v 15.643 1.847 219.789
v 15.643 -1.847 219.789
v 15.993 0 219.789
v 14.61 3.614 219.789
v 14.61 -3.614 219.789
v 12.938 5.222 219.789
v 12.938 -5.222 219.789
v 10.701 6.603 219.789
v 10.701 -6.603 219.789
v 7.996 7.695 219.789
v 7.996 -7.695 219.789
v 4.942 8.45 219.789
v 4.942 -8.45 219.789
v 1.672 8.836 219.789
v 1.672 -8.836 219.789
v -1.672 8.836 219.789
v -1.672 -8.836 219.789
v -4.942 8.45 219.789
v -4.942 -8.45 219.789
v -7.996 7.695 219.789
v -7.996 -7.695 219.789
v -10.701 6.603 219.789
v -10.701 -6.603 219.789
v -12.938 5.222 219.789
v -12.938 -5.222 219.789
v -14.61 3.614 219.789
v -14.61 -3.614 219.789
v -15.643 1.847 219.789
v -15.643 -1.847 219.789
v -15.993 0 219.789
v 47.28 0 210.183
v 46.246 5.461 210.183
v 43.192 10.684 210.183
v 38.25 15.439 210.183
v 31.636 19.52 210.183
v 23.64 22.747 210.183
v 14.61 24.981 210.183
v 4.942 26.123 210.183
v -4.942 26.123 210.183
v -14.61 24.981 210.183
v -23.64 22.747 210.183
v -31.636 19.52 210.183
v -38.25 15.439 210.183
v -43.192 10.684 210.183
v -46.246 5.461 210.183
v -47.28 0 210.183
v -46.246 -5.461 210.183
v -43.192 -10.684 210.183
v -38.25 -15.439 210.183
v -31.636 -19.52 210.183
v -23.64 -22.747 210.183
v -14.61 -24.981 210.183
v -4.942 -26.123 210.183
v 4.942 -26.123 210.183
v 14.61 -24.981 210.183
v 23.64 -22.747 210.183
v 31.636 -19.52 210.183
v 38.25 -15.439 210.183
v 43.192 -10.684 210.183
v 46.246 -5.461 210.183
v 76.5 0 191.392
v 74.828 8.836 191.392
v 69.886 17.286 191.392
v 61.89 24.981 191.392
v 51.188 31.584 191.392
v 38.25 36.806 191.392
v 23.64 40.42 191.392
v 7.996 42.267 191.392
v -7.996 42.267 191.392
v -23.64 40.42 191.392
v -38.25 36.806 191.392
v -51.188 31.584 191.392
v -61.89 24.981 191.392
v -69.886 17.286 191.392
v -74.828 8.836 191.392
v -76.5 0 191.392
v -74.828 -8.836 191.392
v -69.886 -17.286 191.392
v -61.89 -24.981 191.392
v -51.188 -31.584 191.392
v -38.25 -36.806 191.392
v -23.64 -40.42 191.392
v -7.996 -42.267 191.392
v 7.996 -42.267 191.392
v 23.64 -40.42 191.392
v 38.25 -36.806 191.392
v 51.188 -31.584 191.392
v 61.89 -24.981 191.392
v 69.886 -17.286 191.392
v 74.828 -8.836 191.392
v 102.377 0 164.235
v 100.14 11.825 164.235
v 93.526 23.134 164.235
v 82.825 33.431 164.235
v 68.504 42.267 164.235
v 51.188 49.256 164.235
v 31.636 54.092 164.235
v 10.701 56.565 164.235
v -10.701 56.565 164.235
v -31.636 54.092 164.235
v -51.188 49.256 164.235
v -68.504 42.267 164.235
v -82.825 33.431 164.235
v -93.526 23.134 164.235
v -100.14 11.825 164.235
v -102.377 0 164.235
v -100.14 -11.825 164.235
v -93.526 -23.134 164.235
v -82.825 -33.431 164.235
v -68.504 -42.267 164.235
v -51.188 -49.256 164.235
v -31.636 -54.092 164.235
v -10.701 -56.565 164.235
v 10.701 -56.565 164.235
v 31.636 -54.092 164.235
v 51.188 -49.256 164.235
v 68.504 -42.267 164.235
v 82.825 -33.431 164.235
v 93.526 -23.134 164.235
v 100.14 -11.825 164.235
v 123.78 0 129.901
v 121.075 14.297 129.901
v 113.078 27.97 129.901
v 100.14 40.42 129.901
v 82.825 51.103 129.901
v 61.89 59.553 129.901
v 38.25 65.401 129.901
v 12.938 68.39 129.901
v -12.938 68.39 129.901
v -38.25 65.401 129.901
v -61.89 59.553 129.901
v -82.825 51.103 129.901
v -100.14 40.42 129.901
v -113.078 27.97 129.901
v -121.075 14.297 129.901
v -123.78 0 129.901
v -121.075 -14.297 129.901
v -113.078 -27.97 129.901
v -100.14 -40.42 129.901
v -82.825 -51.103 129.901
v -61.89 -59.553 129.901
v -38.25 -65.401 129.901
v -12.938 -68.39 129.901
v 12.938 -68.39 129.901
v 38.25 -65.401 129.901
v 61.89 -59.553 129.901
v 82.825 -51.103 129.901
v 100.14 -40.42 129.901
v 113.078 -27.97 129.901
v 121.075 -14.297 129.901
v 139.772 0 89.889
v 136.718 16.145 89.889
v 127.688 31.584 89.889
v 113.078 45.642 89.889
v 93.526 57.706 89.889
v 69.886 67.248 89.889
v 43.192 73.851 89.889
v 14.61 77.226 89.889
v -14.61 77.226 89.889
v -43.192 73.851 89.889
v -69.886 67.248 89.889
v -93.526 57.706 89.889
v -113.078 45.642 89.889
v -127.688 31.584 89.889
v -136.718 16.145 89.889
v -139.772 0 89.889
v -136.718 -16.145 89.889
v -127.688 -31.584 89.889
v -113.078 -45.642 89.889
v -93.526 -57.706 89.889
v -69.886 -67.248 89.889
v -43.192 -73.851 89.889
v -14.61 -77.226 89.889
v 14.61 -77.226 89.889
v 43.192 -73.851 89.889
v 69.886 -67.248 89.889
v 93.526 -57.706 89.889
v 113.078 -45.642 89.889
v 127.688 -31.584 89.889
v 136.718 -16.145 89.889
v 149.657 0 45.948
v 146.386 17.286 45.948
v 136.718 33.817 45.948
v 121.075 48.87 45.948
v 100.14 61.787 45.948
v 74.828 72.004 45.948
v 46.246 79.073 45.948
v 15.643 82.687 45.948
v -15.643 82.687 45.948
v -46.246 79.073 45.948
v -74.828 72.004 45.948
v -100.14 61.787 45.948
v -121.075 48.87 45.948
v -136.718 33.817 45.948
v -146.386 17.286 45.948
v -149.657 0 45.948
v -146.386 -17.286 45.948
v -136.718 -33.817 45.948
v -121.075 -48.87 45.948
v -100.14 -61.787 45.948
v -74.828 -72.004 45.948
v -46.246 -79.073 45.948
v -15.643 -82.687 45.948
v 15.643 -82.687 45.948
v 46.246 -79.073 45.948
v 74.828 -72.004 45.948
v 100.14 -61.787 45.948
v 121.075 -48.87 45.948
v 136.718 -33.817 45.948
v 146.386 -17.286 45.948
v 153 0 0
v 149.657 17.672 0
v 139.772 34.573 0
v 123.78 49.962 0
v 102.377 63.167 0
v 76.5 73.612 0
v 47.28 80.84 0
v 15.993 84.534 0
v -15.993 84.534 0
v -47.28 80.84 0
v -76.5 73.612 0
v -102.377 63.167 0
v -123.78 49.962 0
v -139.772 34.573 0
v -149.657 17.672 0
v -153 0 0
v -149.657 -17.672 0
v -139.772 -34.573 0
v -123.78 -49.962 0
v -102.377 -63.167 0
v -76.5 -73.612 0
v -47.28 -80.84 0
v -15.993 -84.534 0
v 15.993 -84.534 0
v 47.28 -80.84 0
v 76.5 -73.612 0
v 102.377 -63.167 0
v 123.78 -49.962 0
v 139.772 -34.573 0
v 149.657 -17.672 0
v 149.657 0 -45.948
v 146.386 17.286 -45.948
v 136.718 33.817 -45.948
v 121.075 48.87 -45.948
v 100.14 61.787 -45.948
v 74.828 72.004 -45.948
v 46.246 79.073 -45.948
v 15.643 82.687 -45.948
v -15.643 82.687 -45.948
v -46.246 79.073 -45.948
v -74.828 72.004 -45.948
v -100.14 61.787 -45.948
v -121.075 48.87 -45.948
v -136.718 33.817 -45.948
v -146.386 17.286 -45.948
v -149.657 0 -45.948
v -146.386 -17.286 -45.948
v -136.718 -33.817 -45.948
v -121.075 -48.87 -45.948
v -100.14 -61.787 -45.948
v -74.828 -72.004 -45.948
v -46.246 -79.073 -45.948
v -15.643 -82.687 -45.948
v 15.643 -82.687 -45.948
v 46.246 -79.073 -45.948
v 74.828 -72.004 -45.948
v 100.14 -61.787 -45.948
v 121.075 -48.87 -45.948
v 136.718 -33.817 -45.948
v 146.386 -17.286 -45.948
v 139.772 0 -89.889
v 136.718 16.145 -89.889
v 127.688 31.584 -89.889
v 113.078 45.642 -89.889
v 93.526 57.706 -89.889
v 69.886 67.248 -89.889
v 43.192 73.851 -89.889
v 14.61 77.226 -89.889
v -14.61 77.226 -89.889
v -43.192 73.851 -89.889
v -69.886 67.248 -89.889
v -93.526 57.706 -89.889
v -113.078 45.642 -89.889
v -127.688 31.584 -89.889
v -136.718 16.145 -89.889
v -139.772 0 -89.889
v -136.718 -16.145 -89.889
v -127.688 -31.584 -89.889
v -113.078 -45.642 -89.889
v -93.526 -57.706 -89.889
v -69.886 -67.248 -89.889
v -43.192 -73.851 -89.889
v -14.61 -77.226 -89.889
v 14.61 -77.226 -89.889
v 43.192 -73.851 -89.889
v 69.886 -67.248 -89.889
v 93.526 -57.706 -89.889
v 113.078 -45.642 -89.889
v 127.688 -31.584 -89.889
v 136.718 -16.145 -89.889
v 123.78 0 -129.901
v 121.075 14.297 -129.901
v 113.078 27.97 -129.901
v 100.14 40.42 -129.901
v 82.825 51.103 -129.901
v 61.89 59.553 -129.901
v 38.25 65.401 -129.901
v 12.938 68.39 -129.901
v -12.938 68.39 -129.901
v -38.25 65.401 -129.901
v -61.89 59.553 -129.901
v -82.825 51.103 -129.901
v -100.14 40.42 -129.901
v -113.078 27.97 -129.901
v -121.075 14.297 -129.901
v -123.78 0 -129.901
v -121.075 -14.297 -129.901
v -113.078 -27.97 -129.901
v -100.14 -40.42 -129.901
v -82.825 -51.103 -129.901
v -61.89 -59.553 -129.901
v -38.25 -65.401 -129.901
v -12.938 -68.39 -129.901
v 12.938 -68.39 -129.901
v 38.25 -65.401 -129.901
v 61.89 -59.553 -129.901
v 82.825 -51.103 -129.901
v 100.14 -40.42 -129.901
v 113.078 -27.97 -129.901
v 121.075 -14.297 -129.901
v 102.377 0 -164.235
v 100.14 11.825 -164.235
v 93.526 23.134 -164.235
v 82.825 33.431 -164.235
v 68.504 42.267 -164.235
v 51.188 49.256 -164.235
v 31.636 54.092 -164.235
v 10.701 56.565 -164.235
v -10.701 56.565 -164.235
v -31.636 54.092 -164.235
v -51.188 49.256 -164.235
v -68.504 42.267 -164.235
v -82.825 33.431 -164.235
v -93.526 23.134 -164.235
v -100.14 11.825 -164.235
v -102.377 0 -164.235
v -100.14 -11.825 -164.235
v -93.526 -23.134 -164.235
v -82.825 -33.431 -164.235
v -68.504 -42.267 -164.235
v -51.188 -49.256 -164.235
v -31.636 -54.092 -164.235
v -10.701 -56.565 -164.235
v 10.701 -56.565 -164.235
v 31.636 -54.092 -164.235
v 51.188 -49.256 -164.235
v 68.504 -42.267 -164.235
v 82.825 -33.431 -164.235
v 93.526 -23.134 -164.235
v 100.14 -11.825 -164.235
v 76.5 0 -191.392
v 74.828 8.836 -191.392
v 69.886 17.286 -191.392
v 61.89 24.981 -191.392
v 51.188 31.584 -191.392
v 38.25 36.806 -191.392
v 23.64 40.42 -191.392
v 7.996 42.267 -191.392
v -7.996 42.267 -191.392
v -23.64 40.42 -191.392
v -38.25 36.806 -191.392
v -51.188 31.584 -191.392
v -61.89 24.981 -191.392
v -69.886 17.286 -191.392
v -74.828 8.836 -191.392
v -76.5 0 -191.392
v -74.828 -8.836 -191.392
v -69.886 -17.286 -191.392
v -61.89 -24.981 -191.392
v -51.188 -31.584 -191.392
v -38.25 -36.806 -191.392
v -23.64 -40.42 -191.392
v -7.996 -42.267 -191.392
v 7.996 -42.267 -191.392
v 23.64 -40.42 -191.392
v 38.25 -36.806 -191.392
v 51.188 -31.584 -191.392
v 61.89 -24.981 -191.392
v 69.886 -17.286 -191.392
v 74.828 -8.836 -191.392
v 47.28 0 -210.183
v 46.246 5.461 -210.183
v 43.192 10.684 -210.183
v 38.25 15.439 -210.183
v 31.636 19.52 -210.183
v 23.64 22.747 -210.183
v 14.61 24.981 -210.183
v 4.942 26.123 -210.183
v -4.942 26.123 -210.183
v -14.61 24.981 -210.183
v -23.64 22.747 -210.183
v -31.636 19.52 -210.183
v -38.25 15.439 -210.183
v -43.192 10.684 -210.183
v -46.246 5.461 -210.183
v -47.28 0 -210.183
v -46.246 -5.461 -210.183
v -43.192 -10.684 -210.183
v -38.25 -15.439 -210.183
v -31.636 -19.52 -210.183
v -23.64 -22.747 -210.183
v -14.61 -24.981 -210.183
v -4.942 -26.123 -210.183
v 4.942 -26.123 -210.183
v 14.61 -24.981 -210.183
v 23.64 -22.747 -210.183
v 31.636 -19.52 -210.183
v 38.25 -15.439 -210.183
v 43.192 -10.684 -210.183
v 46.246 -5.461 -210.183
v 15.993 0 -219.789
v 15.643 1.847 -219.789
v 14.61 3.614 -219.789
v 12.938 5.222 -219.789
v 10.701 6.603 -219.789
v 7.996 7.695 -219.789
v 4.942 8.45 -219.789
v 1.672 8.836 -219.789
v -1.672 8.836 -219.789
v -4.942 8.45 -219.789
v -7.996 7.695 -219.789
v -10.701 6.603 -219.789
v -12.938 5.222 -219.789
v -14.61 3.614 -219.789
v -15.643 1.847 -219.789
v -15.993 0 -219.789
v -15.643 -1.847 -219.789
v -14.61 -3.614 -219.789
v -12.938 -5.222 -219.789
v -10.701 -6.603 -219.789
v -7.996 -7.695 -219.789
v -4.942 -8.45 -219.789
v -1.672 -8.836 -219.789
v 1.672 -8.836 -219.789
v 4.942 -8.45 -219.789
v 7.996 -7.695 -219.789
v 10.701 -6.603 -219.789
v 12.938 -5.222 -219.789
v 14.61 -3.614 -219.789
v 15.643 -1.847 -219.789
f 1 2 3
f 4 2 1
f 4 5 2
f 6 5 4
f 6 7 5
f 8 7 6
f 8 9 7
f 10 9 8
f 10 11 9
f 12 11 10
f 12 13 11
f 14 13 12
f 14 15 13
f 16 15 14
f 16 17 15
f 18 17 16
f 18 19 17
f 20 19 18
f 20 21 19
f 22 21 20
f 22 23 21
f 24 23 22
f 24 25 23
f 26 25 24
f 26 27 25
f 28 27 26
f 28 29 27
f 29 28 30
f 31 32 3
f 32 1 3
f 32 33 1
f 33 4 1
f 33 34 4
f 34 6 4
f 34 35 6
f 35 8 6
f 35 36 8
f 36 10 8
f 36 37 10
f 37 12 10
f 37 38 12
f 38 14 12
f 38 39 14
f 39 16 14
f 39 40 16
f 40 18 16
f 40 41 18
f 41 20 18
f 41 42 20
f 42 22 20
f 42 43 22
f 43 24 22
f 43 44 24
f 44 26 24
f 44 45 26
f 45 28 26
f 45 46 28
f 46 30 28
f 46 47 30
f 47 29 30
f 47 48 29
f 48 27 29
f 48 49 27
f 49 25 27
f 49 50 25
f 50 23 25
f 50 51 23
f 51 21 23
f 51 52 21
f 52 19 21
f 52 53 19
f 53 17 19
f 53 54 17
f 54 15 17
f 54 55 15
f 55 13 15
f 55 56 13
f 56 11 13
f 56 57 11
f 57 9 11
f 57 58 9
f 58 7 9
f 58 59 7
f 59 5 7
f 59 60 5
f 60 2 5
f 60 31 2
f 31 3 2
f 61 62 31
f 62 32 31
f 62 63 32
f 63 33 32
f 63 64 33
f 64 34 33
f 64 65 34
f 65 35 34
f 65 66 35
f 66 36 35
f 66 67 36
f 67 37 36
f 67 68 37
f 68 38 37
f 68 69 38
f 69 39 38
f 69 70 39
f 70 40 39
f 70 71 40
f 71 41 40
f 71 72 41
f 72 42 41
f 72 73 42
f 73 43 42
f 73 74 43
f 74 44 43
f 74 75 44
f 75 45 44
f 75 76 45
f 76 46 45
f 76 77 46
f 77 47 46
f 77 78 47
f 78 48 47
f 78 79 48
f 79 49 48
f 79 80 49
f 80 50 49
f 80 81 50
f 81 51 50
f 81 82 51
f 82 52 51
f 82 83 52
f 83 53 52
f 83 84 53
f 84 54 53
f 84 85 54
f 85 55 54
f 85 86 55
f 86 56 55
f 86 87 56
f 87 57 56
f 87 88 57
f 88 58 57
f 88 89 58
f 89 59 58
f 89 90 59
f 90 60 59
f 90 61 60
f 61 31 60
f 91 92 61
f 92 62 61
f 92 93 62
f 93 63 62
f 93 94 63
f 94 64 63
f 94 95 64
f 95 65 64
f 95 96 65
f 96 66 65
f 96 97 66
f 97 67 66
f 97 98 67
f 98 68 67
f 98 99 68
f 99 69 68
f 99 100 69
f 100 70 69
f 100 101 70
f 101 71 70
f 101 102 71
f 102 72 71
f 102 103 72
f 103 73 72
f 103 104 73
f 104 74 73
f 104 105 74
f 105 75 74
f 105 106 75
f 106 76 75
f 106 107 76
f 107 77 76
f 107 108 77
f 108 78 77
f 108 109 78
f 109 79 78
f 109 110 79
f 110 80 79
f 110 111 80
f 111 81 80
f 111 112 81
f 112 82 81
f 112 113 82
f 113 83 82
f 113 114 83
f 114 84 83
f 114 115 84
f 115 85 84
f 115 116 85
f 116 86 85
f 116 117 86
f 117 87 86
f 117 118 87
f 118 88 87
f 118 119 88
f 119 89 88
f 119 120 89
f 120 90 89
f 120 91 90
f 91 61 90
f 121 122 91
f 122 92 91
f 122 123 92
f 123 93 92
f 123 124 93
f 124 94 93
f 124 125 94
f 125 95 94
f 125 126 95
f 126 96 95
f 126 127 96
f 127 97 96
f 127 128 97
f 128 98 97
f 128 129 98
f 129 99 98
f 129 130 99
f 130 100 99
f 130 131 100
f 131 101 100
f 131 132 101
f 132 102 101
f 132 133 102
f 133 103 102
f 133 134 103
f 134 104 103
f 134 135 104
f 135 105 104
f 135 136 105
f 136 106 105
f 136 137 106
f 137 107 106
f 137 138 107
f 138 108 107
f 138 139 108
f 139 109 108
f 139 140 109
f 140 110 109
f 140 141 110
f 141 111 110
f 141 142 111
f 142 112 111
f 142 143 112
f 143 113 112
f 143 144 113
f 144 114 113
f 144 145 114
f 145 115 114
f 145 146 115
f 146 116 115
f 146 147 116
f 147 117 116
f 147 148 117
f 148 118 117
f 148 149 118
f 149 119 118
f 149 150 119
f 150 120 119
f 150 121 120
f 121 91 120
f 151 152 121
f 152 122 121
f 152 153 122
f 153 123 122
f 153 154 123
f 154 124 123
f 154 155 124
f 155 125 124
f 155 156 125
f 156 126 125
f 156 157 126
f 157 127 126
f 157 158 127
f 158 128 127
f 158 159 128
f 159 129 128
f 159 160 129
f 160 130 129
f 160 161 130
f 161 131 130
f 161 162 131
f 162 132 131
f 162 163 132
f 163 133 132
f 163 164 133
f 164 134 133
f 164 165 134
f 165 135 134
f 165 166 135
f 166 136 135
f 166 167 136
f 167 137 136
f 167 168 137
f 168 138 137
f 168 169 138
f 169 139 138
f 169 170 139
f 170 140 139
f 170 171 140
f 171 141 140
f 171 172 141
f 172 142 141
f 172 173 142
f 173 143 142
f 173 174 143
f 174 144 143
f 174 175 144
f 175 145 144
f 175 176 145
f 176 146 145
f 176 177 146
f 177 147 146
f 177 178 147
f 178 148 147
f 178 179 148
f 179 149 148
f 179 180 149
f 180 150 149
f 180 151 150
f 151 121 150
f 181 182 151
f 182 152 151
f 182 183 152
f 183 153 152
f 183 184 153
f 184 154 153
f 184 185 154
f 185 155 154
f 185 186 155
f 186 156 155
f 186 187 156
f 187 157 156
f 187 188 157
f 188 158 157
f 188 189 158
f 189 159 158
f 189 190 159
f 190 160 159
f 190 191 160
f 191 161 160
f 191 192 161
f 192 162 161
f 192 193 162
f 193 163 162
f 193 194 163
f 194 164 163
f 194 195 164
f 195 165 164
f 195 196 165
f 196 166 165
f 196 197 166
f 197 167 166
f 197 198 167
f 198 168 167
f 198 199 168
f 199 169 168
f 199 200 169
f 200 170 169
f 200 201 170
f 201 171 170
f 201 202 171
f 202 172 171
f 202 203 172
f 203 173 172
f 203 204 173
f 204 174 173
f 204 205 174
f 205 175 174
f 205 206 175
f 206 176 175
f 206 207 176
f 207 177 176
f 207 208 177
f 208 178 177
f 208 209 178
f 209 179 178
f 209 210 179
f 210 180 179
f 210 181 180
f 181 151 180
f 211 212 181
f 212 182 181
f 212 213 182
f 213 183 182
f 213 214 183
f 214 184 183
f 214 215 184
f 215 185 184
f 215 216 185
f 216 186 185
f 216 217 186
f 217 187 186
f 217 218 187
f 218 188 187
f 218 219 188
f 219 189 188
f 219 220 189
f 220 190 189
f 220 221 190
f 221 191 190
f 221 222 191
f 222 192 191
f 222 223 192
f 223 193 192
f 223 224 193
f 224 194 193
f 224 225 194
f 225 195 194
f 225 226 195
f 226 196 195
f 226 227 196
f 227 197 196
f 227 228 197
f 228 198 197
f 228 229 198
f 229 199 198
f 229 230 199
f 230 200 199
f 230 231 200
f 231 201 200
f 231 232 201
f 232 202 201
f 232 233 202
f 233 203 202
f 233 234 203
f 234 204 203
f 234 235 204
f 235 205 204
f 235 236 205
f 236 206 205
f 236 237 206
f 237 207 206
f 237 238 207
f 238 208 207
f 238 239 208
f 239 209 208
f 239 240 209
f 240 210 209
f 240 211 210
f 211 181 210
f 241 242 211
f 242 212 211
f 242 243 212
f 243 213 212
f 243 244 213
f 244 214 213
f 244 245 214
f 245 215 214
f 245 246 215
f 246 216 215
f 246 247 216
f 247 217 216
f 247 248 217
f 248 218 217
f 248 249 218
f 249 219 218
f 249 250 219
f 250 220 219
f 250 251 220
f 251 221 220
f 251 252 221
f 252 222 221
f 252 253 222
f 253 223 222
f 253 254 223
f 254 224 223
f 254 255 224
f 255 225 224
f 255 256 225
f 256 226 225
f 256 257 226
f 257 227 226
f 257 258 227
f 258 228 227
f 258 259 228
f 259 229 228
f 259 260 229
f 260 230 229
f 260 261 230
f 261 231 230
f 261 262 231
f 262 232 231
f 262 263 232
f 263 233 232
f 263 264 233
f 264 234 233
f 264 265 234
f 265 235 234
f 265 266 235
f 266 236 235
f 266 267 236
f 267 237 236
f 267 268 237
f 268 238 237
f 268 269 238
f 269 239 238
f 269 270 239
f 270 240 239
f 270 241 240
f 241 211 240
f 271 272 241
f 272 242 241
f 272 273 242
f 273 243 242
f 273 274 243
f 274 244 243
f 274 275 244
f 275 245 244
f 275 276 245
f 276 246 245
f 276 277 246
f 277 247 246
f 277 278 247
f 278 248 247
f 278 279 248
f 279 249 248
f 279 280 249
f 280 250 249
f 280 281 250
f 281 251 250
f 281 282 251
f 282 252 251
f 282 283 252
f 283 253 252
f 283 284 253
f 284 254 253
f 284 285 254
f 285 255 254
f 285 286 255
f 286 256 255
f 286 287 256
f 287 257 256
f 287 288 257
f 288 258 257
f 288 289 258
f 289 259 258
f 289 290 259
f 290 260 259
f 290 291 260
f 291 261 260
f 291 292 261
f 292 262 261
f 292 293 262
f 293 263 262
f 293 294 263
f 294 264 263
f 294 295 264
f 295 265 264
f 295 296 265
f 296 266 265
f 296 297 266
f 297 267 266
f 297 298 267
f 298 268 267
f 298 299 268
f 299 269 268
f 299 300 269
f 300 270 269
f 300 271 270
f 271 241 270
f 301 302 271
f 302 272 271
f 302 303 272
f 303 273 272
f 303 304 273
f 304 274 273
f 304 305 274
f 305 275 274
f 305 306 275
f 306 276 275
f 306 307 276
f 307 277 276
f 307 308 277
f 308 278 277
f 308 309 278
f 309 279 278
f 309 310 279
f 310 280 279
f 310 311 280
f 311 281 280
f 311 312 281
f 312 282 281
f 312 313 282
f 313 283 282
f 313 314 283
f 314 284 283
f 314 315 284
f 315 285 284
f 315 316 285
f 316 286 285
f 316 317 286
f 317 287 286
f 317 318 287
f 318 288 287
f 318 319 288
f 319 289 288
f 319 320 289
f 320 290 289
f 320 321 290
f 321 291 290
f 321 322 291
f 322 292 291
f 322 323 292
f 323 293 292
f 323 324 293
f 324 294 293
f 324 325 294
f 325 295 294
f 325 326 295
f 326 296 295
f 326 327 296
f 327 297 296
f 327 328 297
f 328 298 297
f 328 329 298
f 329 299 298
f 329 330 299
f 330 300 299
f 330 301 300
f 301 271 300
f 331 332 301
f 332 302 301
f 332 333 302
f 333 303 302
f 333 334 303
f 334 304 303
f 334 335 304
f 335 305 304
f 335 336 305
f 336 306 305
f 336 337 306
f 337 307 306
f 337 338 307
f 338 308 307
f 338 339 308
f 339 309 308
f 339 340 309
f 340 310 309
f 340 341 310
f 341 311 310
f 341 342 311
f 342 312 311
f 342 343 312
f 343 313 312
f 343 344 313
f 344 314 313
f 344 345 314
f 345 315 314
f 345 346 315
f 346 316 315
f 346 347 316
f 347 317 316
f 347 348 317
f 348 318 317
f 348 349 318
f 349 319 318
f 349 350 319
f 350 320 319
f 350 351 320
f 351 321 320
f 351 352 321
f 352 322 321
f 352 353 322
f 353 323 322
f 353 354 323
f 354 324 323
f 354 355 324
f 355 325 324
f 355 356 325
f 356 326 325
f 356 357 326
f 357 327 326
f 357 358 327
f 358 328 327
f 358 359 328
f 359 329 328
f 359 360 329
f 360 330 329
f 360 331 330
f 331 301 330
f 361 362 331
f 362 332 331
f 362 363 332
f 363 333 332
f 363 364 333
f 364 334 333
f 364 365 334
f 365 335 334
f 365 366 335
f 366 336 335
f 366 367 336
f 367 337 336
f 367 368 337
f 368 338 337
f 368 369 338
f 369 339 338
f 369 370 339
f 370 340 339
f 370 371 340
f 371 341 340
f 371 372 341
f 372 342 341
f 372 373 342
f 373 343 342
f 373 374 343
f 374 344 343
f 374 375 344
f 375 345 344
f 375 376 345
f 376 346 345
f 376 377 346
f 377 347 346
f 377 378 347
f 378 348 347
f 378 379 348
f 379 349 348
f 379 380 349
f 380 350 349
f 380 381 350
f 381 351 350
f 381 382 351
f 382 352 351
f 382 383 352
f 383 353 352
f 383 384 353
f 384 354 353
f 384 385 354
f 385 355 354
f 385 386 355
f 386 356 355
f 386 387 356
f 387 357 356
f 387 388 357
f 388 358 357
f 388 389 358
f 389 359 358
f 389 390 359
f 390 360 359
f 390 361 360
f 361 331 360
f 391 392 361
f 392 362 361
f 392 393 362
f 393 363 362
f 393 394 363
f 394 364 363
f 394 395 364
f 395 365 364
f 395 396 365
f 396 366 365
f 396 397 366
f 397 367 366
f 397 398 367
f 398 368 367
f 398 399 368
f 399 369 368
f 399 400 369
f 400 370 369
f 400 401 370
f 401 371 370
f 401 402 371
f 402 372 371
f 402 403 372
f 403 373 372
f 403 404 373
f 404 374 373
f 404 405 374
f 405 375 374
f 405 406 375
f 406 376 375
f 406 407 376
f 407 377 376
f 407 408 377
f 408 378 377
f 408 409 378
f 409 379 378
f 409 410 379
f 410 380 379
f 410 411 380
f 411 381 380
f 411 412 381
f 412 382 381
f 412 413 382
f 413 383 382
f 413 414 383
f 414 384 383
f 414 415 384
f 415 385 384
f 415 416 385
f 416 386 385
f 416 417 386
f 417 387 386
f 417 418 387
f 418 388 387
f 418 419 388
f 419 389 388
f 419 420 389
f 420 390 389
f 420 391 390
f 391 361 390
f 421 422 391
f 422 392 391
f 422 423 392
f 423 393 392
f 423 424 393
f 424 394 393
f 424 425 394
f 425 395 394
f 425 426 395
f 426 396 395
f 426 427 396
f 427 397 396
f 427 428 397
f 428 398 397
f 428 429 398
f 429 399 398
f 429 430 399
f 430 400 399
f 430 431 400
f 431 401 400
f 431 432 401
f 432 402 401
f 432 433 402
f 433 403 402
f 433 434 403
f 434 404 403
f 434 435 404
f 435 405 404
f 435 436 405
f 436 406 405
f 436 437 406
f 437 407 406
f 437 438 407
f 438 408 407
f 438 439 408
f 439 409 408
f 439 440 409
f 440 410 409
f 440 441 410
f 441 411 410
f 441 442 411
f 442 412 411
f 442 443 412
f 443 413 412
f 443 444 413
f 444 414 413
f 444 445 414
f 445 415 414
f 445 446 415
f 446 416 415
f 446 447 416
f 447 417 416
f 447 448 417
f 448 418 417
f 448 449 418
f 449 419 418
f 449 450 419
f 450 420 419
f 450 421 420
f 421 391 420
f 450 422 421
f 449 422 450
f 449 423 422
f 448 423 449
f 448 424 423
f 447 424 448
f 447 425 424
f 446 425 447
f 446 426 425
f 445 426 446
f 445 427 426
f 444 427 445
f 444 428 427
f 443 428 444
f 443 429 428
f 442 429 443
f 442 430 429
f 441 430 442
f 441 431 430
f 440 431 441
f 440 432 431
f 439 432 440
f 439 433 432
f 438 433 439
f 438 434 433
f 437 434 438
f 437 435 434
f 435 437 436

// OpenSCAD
// Generated by SolidPython 1.0.1 on 2020-07-29 00:46:48


scale(v = [9, 5, 13]) {
	sphere(r = 17);
}
/***********************************************
*********      SolidPython code:      **********
************************************************
 
# import packages: SolidPython
from solid import *
from solid.utils import *
from itertools import chain, combinations, permutations


class Resize:

    def __init__(self, scad_file):
        self.scad_file = scad_file
        #self.scad_file = import_scad(scad_file)
        # cone/cylinder param:
        self.r1 = 0
        self.r2 = 0
        self.h = 0
        # rectangular prism param:
        self.w = 0
        self.l = 0
        # ellipse param:
        self.r = 0

    # import OpenScad code (file name corresponds to shape)


    # classify shape + parameters
    def assign(self, param1, param2, param3):
        if self.scad_file == 'cone.scad':
            self.r1 = param1
            self.r2 = param2
            self.h = param3
        elif self.scad_file == 'cylinder.scad':
            self.r1 = param1
            self.r2 = param2
            self.h = param3
        elif self.scad_file == 'rectangularPrism.scad':
            self.h = param1
            self.l = param2
            self.w = param3
        else:
            self.r = param1
            self.h = param2

    # resize parameters
    def iterate(self):
        x = range(3, 20, 2)
        i = 1
        if self.scad_file == 'cone.scad':
            tempList = list(permutations(x, 2))
            for temp in tempList:
                param1 = temp[0]
                param2 = temp[1]
                filepath = 'produced_scad_files/' + 'cone' + str(param1) + '_' + str(param2) + '_' + '.scad'
                scad_render_to_file(cylinder(h=param1, r1=param2, r2=0), filepath)

        elif self.scad_file == 'cylinder.scad':
            tempList = list(permutations(x, 3))
            for temp in tempList:
                param1 = temp[0]
                param2 = temp[1]
                filepath = 'produced_scad_files/' + 'cylinder' + str(param1) + '_' + str(param2) + '_' + '.scad'
                scad_render_to_file(cylinder(h=param1, r1=param2, r2=param2), filepath)

        elif self.scad_file == 'rectangularPrism.scad':
            tempList = list(permutations(x, 3))
            for temp in tempList:
                param1 = temp[0]
                param2 = temp[1]
                param3 = temp[2]
                filepath = 'produced_scad_files/' + 'rectangularPrism' + str(param1) + '_' + str(param2) + '_' + str(
                    param3) + '.scad'
                scad_render_to_file(cube(size=(param1, param2, param3)), filepath)

        elif self.scad_file == 'ellipse.scad':
            tempList = list(permutations(x, 4))
            for temp in tempList:
                param1 = temp[0]
                param2 = temp[1]
                param3 = temp[2]
                param4 = temp[3]
                filepath = 'produced_scad_files/' + 'ellipse' + str(param1) + '_' + str(param2) + '_' + str(param3) + '_' + str(param4) + '.scad'
                scad_render_to_file(scale([param1, param2, param3])(sphere(r=param4)), filepath)

    def render_to_scadfile(self):
        scad_render_to_file(scad, 'example.scad') 
 
************************************************/
